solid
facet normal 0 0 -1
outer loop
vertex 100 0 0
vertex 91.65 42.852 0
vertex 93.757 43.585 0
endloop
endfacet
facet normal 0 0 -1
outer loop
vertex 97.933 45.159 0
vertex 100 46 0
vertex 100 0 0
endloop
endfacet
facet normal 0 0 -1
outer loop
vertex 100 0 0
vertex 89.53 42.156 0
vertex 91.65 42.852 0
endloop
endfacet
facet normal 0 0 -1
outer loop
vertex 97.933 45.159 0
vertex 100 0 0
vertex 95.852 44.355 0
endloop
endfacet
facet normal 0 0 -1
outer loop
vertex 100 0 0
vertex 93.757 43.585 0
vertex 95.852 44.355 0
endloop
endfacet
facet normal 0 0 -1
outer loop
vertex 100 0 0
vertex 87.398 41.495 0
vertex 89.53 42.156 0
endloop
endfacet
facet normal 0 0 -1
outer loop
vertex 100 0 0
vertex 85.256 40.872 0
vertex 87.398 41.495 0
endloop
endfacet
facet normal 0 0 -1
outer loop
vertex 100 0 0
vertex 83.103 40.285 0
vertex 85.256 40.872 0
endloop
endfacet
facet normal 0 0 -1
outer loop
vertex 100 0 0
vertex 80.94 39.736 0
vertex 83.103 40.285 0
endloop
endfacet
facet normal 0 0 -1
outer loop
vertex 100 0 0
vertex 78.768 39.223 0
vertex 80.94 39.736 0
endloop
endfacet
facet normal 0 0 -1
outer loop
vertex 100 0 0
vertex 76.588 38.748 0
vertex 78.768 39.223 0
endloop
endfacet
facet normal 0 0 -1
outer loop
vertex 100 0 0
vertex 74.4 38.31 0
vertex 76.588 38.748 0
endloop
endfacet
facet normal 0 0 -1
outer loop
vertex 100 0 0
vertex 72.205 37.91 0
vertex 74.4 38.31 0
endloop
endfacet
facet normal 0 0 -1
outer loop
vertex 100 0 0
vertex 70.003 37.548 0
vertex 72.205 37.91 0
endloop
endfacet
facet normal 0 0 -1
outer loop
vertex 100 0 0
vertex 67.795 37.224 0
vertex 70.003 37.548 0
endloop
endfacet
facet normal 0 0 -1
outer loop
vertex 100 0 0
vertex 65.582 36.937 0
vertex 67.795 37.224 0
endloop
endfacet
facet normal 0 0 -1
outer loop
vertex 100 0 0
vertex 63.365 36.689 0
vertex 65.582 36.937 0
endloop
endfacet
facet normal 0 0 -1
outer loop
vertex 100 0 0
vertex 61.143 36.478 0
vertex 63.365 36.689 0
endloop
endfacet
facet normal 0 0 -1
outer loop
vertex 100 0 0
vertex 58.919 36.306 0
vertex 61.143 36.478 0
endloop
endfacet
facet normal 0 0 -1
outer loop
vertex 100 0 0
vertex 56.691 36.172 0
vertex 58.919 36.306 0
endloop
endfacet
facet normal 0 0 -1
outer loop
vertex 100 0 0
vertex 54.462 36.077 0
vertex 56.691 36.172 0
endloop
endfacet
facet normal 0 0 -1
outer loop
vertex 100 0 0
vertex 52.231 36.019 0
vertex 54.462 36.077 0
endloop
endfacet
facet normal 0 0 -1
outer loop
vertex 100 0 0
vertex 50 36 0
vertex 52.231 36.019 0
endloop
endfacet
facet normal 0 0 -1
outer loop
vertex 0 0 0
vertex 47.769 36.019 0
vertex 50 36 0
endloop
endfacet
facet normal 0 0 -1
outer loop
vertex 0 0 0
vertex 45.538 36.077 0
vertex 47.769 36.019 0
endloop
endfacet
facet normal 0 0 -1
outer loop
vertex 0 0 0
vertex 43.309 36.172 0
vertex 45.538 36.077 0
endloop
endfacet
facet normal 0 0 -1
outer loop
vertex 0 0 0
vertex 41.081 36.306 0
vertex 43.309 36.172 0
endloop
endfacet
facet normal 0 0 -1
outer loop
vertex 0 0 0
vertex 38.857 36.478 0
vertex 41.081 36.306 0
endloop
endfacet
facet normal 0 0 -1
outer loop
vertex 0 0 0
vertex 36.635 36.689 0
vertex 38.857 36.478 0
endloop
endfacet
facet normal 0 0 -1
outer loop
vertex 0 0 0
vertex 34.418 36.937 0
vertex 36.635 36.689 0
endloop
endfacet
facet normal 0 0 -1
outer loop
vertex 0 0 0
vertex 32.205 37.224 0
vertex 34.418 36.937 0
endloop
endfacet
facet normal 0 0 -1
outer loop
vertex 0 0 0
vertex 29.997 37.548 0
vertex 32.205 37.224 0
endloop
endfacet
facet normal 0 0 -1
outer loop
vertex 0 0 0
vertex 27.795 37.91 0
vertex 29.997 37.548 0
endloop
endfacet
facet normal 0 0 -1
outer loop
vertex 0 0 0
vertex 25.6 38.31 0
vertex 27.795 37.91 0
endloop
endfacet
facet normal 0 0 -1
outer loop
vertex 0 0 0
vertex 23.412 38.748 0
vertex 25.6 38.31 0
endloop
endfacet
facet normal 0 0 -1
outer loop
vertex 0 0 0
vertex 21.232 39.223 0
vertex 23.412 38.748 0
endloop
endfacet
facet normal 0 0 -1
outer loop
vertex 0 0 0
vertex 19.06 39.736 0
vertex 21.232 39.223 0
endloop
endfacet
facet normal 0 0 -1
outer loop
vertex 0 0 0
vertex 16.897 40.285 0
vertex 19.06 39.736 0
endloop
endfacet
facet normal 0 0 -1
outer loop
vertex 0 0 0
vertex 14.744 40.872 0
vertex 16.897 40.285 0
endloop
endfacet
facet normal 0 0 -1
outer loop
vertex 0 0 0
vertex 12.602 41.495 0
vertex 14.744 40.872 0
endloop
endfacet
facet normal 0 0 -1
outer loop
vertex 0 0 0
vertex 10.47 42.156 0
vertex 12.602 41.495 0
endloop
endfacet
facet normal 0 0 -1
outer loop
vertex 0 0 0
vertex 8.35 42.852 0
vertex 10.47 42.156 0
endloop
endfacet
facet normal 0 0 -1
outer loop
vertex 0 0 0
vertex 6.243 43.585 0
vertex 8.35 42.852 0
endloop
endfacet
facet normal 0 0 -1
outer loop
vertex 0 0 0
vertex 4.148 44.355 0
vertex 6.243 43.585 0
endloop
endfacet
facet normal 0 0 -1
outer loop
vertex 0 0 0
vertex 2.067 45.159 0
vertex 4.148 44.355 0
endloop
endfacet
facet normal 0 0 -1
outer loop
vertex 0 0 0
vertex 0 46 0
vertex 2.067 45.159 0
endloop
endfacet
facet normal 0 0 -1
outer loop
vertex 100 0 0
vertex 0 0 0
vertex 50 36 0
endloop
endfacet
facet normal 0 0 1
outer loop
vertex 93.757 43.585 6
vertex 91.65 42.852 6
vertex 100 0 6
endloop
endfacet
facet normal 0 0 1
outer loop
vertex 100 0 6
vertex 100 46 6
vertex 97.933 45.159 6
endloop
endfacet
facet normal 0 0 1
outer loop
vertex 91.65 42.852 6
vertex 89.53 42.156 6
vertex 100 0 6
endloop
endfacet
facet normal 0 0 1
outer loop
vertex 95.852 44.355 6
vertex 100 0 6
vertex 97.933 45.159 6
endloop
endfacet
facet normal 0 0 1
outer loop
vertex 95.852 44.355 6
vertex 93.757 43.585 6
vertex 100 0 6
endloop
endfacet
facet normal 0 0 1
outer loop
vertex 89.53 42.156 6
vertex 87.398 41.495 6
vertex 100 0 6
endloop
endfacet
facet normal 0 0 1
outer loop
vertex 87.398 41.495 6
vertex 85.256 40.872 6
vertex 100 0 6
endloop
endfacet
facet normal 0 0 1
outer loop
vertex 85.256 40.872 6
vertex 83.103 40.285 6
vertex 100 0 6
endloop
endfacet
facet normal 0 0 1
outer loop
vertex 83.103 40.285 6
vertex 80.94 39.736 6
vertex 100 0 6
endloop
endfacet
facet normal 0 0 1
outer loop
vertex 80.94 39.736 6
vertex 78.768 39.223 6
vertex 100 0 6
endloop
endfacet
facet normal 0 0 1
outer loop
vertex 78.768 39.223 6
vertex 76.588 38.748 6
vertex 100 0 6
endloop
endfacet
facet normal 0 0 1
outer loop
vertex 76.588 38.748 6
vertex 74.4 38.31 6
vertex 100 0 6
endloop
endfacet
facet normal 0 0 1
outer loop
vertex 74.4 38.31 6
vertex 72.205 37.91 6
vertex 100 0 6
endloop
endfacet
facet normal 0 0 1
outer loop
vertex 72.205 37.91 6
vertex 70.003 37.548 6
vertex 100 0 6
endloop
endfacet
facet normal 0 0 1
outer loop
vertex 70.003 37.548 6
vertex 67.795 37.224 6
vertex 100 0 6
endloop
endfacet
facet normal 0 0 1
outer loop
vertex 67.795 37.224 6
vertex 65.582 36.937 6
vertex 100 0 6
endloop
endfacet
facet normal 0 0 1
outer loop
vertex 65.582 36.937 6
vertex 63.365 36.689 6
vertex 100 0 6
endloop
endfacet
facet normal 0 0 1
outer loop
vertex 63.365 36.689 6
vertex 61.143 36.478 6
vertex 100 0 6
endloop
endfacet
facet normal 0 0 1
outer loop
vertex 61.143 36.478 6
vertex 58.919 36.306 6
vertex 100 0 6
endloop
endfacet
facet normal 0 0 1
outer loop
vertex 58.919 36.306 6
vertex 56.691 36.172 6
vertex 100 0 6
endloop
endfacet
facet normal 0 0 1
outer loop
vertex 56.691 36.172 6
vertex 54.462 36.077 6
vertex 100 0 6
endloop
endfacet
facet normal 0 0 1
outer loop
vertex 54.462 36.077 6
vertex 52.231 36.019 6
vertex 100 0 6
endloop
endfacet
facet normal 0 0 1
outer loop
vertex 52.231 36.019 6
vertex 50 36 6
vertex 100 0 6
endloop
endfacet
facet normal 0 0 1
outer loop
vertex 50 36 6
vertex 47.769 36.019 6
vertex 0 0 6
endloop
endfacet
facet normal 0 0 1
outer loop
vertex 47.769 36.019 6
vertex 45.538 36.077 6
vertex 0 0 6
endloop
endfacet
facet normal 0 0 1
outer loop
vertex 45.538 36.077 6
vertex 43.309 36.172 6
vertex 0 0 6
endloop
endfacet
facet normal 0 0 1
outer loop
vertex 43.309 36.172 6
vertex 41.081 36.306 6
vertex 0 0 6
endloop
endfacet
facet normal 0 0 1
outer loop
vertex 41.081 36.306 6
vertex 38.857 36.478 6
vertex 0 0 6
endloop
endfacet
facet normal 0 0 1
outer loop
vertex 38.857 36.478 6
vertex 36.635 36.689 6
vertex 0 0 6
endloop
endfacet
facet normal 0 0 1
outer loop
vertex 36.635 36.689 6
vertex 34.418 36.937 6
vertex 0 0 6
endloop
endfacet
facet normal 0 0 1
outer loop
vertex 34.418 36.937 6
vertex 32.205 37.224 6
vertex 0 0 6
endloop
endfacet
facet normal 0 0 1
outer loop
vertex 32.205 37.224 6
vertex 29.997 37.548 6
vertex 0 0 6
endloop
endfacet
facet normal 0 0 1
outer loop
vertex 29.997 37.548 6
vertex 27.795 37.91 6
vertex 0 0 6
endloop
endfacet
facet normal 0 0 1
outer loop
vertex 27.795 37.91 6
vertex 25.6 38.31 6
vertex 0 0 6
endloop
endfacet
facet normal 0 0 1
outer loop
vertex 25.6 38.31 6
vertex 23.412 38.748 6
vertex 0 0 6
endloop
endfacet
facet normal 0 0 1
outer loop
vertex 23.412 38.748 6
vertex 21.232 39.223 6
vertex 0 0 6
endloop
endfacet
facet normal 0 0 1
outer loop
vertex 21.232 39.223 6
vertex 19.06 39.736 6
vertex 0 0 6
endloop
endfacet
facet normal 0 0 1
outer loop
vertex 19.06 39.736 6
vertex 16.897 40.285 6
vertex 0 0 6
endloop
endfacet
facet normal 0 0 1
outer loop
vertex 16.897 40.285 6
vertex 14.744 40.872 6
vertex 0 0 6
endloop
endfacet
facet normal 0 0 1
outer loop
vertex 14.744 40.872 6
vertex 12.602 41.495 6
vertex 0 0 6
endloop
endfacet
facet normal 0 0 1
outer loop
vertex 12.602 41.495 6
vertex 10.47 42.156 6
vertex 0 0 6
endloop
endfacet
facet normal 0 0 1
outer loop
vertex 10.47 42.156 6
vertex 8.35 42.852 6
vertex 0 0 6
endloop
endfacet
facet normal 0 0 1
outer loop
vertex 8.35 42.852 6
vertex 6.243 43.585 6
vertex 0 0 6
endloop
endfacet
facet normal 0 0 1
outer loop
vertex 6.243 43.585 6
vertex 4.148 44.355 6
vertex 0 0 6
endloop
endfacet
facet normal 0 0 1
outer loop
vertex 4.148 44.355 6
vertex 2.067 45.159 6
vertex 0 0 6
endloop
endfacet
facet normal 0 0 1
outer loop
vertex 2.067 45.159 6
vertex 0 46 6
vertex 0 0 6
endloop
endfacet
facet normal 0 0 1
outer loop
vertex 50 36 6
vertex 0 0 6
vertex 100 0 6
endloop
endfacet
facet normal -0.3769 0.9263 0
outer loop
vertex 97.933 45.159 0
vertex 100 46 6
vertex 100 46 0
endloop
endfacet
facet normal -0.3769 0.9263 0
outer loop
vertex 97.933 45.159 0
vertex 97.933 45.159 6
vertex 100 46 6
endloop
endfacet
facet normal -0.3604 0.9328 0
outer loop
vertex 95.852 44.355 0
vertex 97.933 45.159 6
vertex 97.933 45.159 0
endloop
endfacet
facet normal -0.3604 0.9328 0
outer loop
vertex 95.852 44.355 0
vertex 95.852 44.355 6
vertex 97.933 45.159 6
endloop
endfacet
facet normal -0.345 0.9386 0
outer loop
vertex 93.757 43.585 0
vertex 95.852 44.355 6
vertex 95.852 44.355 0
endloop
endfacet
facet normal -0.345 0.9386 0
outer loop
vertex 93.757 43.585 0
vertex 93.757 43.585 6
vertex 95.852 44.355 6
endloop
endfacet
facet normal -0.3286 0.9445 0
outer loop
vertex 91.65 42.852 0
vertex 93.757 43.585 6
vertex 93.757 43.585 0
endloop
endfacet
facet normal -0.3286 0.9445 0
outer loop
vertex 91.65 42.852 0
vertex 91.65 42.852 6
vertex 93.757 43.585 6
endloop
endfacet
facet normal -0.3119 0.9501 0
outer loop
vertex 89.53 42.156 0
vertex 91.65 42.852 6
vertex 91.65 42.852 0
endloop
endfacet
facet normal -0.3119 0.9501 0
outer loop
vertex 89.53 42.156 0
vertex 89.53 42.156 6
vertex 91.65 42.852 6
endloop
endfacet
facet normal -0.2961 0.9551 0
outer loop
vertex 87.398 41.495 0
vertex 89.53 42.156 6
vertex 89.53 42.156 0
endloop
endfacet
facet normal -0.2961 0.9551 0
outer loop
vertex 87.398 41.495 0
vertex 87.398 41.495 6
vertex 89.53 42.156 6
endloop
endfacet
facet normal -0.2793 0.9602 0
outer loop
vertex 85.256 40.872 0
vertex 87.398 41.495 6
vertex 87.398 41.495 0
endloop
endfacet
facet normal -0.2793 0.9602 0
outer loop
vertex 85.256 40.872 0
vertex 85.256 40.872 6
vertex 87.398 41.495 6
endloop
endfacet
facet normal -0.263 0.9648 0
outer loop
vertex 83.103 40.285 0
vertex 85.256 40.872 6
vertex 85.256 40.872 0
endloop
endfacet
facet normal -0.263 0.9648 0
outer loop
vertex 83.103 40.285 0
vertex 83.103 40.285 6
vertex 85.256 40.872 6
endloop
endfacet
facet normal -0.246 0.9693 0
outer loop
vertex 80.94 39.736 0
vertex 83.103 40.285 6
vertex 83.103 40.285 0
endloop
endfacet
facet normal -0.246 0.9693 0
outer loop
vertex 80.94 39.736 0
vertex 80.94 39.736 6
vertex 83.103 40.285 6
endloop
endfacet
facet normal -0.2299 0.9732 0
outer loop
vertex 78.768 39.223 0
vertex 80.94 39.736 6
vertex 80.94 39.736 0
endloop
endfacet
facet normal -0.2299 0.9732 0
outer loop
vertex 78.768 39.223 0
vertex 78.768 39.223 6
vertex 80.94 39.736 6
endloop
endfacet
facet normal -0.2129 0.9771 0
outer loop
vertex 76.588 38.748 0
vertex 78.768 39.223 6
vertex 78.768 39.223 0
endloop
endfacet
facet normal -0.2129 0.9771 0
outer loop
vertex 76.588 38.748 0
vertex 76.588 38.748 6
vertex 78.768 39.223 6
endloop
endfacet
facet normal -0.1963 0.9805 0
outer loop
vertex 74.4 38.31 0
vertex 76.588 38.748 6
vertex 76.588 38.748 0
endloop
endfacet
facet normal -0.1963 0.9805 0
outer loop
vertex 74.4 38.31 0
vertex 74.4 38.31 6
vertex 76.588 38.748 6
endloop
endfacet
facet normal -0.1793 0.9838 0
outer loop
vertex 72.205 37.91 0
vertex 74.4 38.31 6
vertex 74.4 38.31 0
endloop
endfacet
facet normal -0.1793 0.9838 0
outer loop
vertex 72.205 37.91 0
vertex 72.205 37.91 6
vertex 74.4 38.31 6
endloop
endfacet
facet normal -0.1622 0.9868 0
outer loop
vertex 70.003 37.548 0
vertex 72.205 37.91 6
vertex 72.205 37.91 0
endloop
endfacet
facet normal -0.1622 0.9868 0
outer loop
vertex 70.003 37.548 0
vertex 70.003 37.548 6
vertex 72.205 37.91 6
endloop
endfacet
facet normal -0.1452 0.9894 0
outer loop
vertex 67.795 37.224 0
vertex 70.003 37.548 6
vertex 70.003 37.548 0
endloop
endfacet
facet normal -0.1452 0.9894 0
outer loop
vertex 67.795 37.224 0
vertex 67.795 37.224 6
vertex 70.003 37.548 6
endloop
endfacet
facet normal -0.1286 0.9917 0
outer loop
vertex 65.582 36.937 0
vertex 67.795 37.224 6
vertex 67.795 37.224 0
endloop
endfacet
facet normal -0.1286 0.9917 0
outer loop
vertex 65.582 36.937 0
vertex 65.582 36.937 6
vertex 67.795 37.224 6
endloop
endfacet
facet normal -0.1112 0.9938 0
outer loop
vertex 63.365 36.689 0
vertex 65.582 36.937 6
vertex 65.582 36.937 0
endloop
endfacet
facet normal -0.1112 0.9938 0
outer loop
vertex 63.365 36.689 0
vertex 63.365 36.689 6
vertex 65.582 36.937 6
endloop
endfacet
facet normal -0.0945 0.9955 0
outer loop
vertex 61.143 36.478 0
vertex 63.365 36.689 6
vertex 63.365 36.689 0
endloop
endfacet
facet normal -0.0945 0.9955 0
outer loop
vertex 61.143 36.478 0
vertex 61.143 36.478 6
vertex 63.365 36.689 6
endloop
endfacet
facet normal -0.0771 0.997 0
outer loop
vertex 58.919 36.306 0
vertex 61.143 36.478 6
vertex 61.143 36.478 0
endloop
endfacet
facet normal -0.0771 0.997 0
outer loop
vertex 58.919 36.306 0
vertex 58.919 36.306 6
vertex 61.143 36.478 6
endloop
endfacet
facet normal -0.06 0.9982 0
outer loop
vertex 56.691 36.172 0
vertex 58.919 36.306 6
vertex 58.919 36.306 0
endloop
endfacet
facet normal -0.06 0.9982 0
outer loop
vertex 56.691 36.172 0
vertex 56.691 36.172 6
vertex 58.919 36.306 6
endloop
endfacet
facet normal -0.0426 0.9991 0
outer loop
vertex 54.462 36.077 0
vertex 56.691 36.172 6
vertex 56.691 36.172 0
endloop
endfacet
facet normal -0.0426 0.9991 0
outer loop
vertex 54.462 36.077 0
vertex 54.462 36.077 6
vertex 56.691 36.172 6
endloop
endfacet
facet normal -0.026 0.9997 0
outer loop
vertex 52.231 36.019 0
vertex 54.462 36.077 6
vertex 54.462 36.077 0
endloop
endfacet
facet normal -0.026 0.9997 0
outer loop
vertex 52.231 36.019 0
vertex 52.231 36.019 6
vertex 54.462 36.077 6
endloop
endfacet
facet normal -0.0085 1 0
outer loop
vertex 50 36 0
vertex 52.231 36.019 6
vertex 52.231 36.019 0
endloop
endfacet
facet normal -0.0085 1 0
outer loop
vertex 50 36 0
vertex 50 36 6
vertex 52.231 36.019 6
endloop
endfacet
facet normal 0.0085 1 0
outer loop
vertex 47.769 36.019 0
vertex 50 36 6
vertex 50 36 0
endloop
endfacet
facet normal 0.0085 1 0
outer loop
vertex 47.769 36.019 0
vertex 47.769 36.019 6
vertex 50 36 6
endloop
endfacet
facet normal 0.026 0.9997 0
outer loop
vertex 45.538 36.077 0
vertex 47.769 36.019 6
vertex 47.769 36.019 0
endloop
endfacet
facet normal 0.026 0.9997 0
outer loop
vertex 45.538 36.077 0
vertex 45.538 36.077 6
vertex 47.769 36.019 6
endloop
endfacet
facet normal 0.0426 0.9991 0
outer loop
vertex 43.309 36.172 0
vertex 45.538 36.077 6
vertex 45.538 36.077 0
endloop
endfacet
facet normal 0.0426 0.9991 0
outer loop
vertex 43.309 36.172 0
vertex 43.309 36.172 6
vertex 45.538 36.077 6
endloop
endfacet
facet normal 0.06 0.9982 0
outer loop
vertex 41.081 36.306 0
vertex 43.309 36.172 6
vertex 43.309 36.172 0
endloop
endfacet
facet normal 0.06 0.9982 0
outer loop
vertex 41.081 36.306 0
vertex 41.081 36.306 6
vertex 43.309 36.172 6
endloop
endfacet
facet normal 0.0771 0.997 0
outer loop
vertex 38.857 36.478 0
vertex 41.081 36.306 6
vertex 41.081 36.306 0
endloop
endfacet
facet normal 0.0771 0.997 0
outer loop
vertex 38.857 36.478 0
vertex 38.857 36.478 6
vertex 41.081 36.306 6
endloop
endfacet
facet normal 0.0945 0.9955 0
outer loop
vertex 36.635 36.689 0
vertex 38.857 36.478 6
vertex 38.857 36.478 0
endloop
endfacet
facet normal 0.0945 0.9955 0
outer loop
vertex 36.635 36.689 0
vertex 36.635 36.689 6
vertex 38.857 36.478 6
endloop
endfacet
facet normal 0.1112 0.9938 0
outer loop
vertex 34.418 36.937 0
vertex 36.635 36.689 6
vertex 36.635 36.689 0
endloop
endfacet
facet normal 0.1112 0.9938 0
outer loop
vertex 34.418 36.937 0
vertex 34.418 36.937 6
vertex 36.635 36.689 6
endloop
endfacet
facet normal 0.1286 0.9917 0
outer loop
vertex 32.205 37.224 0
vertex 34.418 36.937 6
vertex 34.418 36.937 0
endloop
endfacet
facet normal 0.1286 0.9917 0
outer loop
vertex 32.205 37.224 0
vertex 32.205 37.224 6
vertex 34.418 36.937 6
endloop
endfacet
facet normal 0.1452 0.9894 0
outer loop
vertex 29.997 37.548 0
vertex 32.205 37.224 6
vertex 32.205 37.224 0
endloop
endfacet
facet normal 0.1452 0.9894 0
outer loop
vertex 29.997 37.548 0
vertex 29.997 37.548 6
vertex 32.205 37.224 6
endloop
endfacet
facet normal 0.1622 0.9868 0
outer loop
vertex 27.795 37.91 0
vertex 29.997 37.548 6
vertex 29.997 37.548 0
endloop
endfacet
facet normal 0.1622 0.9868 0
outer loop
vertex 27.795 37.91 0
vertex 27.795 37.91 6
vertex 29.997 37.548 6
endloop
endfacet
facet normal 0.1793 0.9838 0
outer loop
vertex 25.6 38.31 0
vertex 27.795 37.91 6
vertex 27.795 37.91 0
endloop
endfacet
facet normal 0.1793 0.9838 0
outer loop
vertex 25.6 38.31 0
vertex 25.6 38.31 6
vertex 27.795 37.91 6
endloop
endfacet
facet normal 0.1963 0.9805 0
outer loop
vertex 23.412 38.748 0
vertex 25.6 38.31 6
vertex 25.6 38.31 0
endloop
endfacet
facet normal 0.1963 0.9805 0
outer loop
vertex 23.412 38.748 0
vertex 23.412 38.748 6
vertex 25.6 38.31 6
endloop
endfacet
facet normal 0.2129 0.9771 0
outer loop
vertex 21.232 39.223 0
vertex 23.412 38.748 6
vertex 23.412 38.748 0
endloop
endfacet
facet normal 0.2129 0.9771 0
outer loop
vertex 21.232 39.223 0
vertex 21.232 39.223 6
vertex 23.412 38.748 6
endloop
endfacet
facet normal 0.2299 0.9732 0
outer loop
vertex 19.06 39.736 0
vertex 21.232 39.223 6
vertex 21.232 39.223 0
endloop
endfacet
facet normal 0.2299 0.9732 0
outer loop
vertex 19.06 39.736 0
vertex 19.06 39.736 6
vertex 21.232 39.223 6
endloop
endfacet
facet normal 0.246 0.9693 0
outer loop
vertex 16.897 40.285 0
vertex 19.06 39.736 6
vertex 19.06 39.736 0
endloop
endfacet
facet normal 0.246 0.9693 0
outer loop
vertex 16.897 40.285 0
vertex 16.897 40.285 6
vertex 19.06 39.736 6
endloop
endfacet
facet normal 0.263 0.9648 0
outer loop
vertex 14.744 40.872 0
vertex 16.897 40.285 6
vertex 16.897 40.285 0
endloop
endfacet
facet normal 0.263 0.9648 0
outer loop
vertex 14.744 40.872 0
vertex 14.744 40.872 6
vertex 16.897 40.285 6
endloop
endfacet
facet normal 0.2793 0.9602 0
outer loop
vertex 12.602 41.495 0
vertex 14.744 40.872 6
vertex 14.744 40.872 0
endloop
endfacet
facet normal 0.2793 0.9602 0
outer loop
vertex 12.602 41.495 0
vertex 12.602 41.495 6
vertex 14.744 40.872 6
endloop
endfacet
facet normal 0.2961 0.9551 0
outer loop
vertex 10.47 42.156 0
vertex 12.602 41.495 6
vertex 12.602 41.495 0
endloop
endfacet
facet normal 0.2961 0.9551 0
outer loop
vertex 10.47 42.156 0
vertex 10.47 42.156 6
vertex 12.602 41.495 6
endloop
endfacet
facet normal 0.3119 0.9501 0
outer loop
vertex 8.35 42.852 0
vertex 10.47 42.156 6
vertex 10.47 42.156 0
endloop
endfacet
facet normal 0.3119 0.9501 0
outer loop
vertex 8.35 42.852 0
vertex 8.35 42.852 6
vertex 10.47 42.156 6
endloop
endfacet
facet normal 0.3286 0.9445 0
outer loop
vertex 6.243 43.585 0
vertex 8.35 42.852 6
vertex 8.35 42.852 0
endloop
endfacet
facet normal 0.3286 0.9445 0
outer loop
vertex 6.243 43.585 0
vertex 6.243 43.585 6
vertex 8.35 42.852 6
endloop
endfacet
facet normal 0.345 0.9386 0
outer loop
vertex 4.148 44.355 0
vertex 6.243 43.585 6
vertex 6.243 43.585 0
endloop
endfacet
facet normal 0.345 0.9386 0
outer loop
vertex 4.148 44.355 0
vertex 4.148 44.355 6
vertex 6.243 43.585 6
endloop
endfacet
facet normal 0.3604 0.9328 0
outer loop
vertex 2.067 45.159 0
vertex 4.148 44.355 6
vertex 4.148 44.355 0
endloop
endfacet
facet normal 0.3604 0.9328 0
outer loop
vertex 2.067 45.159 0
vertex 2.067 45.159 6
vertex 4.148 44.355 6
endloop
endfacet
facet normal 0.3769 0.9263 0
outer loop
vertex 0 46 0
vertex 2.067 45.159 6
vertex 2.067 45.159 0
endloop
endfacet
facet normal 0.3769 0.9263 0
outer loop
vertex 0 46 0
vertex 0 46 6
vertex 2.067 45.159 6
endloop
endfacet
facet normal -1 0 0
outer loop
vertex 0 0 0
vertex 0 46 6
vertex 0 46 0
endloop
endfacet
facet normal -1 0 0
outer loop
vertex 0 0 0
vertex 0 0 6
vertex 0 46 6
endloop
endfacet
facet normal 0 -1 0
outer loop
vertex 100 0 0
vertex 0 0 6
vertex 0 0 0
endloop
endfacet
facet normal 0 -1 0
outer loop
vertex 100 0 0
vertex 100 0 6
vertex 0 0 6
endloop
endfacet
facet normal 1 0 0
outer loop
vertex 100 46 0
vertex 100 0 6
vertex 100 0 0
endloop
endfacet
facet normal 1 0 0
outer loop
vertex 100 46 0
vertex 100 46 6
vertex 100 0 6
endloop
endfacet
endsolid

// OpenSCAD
$fn = 32;

// ----------------------------------------------------------------------
// Arc profile plate: notch, 49 points
// ----------------------------------------------------------------------

// --- parameters (mm) ---
bar_l = 100;              // bar length, X
bar_w = 46;               // bar width, Y
notch_depth = 10;         // depth of the arc notch at mid-span
arc_r = 130;              // radius of the notch arc
arc_angle = 45.24;        // notch arc angle, degrees
arc_step = 1;             // sampling step of the notch arc, degrees
plate_t = 6;              // plate thickness, Z

profile = [[0, 0], [100, 0], [100, 46], [97.933, 45.159], [95.852, 44.355], [93.757, 43.585], [91.65, 42.852], [89.53, 42.156], [87.398, 41.495], [85.256, 40.872], [83.103, 40.285], [80.94, 39.736], [78.768, 39.223], [76.588, 38.748], [74.4, 38.31], [72.205, 37.91], [70.003, 37.548], [67.795, 37.224], [65.582, 36.937], [63.365, 36.689], [61.143, 36.478], [58.919, 36.306], [56.691, 36.172], [54.462, 36.077], [52.231, 36.019], [50, 36], [47.769, 36.019], [45.538, 36.077], [43.309, 36.172], [41.081, 36.306], [38.857, 36.478], [36.635, 36.689], [34.418, 36.937], [32.205, 37.224], [29.997, 37.548], [27.795, 37.91], [25.6, 38.31], [23.412, 38.748], [21.232, 39.223], [19.06, 39.736], [16.897, 40.285], [14.744, 40.872], [12.602, 41.495], [10.47, 42.156], [8.35, 42.852], [6.243, 43.585], [4.148, 44.355], [2.067, 45.159], [0, 46]];  // primary outline, 49 points, counter clockwise

// --- the one profile operation ---
linear_extrude(height = plate_t) polygon(points = profile);
